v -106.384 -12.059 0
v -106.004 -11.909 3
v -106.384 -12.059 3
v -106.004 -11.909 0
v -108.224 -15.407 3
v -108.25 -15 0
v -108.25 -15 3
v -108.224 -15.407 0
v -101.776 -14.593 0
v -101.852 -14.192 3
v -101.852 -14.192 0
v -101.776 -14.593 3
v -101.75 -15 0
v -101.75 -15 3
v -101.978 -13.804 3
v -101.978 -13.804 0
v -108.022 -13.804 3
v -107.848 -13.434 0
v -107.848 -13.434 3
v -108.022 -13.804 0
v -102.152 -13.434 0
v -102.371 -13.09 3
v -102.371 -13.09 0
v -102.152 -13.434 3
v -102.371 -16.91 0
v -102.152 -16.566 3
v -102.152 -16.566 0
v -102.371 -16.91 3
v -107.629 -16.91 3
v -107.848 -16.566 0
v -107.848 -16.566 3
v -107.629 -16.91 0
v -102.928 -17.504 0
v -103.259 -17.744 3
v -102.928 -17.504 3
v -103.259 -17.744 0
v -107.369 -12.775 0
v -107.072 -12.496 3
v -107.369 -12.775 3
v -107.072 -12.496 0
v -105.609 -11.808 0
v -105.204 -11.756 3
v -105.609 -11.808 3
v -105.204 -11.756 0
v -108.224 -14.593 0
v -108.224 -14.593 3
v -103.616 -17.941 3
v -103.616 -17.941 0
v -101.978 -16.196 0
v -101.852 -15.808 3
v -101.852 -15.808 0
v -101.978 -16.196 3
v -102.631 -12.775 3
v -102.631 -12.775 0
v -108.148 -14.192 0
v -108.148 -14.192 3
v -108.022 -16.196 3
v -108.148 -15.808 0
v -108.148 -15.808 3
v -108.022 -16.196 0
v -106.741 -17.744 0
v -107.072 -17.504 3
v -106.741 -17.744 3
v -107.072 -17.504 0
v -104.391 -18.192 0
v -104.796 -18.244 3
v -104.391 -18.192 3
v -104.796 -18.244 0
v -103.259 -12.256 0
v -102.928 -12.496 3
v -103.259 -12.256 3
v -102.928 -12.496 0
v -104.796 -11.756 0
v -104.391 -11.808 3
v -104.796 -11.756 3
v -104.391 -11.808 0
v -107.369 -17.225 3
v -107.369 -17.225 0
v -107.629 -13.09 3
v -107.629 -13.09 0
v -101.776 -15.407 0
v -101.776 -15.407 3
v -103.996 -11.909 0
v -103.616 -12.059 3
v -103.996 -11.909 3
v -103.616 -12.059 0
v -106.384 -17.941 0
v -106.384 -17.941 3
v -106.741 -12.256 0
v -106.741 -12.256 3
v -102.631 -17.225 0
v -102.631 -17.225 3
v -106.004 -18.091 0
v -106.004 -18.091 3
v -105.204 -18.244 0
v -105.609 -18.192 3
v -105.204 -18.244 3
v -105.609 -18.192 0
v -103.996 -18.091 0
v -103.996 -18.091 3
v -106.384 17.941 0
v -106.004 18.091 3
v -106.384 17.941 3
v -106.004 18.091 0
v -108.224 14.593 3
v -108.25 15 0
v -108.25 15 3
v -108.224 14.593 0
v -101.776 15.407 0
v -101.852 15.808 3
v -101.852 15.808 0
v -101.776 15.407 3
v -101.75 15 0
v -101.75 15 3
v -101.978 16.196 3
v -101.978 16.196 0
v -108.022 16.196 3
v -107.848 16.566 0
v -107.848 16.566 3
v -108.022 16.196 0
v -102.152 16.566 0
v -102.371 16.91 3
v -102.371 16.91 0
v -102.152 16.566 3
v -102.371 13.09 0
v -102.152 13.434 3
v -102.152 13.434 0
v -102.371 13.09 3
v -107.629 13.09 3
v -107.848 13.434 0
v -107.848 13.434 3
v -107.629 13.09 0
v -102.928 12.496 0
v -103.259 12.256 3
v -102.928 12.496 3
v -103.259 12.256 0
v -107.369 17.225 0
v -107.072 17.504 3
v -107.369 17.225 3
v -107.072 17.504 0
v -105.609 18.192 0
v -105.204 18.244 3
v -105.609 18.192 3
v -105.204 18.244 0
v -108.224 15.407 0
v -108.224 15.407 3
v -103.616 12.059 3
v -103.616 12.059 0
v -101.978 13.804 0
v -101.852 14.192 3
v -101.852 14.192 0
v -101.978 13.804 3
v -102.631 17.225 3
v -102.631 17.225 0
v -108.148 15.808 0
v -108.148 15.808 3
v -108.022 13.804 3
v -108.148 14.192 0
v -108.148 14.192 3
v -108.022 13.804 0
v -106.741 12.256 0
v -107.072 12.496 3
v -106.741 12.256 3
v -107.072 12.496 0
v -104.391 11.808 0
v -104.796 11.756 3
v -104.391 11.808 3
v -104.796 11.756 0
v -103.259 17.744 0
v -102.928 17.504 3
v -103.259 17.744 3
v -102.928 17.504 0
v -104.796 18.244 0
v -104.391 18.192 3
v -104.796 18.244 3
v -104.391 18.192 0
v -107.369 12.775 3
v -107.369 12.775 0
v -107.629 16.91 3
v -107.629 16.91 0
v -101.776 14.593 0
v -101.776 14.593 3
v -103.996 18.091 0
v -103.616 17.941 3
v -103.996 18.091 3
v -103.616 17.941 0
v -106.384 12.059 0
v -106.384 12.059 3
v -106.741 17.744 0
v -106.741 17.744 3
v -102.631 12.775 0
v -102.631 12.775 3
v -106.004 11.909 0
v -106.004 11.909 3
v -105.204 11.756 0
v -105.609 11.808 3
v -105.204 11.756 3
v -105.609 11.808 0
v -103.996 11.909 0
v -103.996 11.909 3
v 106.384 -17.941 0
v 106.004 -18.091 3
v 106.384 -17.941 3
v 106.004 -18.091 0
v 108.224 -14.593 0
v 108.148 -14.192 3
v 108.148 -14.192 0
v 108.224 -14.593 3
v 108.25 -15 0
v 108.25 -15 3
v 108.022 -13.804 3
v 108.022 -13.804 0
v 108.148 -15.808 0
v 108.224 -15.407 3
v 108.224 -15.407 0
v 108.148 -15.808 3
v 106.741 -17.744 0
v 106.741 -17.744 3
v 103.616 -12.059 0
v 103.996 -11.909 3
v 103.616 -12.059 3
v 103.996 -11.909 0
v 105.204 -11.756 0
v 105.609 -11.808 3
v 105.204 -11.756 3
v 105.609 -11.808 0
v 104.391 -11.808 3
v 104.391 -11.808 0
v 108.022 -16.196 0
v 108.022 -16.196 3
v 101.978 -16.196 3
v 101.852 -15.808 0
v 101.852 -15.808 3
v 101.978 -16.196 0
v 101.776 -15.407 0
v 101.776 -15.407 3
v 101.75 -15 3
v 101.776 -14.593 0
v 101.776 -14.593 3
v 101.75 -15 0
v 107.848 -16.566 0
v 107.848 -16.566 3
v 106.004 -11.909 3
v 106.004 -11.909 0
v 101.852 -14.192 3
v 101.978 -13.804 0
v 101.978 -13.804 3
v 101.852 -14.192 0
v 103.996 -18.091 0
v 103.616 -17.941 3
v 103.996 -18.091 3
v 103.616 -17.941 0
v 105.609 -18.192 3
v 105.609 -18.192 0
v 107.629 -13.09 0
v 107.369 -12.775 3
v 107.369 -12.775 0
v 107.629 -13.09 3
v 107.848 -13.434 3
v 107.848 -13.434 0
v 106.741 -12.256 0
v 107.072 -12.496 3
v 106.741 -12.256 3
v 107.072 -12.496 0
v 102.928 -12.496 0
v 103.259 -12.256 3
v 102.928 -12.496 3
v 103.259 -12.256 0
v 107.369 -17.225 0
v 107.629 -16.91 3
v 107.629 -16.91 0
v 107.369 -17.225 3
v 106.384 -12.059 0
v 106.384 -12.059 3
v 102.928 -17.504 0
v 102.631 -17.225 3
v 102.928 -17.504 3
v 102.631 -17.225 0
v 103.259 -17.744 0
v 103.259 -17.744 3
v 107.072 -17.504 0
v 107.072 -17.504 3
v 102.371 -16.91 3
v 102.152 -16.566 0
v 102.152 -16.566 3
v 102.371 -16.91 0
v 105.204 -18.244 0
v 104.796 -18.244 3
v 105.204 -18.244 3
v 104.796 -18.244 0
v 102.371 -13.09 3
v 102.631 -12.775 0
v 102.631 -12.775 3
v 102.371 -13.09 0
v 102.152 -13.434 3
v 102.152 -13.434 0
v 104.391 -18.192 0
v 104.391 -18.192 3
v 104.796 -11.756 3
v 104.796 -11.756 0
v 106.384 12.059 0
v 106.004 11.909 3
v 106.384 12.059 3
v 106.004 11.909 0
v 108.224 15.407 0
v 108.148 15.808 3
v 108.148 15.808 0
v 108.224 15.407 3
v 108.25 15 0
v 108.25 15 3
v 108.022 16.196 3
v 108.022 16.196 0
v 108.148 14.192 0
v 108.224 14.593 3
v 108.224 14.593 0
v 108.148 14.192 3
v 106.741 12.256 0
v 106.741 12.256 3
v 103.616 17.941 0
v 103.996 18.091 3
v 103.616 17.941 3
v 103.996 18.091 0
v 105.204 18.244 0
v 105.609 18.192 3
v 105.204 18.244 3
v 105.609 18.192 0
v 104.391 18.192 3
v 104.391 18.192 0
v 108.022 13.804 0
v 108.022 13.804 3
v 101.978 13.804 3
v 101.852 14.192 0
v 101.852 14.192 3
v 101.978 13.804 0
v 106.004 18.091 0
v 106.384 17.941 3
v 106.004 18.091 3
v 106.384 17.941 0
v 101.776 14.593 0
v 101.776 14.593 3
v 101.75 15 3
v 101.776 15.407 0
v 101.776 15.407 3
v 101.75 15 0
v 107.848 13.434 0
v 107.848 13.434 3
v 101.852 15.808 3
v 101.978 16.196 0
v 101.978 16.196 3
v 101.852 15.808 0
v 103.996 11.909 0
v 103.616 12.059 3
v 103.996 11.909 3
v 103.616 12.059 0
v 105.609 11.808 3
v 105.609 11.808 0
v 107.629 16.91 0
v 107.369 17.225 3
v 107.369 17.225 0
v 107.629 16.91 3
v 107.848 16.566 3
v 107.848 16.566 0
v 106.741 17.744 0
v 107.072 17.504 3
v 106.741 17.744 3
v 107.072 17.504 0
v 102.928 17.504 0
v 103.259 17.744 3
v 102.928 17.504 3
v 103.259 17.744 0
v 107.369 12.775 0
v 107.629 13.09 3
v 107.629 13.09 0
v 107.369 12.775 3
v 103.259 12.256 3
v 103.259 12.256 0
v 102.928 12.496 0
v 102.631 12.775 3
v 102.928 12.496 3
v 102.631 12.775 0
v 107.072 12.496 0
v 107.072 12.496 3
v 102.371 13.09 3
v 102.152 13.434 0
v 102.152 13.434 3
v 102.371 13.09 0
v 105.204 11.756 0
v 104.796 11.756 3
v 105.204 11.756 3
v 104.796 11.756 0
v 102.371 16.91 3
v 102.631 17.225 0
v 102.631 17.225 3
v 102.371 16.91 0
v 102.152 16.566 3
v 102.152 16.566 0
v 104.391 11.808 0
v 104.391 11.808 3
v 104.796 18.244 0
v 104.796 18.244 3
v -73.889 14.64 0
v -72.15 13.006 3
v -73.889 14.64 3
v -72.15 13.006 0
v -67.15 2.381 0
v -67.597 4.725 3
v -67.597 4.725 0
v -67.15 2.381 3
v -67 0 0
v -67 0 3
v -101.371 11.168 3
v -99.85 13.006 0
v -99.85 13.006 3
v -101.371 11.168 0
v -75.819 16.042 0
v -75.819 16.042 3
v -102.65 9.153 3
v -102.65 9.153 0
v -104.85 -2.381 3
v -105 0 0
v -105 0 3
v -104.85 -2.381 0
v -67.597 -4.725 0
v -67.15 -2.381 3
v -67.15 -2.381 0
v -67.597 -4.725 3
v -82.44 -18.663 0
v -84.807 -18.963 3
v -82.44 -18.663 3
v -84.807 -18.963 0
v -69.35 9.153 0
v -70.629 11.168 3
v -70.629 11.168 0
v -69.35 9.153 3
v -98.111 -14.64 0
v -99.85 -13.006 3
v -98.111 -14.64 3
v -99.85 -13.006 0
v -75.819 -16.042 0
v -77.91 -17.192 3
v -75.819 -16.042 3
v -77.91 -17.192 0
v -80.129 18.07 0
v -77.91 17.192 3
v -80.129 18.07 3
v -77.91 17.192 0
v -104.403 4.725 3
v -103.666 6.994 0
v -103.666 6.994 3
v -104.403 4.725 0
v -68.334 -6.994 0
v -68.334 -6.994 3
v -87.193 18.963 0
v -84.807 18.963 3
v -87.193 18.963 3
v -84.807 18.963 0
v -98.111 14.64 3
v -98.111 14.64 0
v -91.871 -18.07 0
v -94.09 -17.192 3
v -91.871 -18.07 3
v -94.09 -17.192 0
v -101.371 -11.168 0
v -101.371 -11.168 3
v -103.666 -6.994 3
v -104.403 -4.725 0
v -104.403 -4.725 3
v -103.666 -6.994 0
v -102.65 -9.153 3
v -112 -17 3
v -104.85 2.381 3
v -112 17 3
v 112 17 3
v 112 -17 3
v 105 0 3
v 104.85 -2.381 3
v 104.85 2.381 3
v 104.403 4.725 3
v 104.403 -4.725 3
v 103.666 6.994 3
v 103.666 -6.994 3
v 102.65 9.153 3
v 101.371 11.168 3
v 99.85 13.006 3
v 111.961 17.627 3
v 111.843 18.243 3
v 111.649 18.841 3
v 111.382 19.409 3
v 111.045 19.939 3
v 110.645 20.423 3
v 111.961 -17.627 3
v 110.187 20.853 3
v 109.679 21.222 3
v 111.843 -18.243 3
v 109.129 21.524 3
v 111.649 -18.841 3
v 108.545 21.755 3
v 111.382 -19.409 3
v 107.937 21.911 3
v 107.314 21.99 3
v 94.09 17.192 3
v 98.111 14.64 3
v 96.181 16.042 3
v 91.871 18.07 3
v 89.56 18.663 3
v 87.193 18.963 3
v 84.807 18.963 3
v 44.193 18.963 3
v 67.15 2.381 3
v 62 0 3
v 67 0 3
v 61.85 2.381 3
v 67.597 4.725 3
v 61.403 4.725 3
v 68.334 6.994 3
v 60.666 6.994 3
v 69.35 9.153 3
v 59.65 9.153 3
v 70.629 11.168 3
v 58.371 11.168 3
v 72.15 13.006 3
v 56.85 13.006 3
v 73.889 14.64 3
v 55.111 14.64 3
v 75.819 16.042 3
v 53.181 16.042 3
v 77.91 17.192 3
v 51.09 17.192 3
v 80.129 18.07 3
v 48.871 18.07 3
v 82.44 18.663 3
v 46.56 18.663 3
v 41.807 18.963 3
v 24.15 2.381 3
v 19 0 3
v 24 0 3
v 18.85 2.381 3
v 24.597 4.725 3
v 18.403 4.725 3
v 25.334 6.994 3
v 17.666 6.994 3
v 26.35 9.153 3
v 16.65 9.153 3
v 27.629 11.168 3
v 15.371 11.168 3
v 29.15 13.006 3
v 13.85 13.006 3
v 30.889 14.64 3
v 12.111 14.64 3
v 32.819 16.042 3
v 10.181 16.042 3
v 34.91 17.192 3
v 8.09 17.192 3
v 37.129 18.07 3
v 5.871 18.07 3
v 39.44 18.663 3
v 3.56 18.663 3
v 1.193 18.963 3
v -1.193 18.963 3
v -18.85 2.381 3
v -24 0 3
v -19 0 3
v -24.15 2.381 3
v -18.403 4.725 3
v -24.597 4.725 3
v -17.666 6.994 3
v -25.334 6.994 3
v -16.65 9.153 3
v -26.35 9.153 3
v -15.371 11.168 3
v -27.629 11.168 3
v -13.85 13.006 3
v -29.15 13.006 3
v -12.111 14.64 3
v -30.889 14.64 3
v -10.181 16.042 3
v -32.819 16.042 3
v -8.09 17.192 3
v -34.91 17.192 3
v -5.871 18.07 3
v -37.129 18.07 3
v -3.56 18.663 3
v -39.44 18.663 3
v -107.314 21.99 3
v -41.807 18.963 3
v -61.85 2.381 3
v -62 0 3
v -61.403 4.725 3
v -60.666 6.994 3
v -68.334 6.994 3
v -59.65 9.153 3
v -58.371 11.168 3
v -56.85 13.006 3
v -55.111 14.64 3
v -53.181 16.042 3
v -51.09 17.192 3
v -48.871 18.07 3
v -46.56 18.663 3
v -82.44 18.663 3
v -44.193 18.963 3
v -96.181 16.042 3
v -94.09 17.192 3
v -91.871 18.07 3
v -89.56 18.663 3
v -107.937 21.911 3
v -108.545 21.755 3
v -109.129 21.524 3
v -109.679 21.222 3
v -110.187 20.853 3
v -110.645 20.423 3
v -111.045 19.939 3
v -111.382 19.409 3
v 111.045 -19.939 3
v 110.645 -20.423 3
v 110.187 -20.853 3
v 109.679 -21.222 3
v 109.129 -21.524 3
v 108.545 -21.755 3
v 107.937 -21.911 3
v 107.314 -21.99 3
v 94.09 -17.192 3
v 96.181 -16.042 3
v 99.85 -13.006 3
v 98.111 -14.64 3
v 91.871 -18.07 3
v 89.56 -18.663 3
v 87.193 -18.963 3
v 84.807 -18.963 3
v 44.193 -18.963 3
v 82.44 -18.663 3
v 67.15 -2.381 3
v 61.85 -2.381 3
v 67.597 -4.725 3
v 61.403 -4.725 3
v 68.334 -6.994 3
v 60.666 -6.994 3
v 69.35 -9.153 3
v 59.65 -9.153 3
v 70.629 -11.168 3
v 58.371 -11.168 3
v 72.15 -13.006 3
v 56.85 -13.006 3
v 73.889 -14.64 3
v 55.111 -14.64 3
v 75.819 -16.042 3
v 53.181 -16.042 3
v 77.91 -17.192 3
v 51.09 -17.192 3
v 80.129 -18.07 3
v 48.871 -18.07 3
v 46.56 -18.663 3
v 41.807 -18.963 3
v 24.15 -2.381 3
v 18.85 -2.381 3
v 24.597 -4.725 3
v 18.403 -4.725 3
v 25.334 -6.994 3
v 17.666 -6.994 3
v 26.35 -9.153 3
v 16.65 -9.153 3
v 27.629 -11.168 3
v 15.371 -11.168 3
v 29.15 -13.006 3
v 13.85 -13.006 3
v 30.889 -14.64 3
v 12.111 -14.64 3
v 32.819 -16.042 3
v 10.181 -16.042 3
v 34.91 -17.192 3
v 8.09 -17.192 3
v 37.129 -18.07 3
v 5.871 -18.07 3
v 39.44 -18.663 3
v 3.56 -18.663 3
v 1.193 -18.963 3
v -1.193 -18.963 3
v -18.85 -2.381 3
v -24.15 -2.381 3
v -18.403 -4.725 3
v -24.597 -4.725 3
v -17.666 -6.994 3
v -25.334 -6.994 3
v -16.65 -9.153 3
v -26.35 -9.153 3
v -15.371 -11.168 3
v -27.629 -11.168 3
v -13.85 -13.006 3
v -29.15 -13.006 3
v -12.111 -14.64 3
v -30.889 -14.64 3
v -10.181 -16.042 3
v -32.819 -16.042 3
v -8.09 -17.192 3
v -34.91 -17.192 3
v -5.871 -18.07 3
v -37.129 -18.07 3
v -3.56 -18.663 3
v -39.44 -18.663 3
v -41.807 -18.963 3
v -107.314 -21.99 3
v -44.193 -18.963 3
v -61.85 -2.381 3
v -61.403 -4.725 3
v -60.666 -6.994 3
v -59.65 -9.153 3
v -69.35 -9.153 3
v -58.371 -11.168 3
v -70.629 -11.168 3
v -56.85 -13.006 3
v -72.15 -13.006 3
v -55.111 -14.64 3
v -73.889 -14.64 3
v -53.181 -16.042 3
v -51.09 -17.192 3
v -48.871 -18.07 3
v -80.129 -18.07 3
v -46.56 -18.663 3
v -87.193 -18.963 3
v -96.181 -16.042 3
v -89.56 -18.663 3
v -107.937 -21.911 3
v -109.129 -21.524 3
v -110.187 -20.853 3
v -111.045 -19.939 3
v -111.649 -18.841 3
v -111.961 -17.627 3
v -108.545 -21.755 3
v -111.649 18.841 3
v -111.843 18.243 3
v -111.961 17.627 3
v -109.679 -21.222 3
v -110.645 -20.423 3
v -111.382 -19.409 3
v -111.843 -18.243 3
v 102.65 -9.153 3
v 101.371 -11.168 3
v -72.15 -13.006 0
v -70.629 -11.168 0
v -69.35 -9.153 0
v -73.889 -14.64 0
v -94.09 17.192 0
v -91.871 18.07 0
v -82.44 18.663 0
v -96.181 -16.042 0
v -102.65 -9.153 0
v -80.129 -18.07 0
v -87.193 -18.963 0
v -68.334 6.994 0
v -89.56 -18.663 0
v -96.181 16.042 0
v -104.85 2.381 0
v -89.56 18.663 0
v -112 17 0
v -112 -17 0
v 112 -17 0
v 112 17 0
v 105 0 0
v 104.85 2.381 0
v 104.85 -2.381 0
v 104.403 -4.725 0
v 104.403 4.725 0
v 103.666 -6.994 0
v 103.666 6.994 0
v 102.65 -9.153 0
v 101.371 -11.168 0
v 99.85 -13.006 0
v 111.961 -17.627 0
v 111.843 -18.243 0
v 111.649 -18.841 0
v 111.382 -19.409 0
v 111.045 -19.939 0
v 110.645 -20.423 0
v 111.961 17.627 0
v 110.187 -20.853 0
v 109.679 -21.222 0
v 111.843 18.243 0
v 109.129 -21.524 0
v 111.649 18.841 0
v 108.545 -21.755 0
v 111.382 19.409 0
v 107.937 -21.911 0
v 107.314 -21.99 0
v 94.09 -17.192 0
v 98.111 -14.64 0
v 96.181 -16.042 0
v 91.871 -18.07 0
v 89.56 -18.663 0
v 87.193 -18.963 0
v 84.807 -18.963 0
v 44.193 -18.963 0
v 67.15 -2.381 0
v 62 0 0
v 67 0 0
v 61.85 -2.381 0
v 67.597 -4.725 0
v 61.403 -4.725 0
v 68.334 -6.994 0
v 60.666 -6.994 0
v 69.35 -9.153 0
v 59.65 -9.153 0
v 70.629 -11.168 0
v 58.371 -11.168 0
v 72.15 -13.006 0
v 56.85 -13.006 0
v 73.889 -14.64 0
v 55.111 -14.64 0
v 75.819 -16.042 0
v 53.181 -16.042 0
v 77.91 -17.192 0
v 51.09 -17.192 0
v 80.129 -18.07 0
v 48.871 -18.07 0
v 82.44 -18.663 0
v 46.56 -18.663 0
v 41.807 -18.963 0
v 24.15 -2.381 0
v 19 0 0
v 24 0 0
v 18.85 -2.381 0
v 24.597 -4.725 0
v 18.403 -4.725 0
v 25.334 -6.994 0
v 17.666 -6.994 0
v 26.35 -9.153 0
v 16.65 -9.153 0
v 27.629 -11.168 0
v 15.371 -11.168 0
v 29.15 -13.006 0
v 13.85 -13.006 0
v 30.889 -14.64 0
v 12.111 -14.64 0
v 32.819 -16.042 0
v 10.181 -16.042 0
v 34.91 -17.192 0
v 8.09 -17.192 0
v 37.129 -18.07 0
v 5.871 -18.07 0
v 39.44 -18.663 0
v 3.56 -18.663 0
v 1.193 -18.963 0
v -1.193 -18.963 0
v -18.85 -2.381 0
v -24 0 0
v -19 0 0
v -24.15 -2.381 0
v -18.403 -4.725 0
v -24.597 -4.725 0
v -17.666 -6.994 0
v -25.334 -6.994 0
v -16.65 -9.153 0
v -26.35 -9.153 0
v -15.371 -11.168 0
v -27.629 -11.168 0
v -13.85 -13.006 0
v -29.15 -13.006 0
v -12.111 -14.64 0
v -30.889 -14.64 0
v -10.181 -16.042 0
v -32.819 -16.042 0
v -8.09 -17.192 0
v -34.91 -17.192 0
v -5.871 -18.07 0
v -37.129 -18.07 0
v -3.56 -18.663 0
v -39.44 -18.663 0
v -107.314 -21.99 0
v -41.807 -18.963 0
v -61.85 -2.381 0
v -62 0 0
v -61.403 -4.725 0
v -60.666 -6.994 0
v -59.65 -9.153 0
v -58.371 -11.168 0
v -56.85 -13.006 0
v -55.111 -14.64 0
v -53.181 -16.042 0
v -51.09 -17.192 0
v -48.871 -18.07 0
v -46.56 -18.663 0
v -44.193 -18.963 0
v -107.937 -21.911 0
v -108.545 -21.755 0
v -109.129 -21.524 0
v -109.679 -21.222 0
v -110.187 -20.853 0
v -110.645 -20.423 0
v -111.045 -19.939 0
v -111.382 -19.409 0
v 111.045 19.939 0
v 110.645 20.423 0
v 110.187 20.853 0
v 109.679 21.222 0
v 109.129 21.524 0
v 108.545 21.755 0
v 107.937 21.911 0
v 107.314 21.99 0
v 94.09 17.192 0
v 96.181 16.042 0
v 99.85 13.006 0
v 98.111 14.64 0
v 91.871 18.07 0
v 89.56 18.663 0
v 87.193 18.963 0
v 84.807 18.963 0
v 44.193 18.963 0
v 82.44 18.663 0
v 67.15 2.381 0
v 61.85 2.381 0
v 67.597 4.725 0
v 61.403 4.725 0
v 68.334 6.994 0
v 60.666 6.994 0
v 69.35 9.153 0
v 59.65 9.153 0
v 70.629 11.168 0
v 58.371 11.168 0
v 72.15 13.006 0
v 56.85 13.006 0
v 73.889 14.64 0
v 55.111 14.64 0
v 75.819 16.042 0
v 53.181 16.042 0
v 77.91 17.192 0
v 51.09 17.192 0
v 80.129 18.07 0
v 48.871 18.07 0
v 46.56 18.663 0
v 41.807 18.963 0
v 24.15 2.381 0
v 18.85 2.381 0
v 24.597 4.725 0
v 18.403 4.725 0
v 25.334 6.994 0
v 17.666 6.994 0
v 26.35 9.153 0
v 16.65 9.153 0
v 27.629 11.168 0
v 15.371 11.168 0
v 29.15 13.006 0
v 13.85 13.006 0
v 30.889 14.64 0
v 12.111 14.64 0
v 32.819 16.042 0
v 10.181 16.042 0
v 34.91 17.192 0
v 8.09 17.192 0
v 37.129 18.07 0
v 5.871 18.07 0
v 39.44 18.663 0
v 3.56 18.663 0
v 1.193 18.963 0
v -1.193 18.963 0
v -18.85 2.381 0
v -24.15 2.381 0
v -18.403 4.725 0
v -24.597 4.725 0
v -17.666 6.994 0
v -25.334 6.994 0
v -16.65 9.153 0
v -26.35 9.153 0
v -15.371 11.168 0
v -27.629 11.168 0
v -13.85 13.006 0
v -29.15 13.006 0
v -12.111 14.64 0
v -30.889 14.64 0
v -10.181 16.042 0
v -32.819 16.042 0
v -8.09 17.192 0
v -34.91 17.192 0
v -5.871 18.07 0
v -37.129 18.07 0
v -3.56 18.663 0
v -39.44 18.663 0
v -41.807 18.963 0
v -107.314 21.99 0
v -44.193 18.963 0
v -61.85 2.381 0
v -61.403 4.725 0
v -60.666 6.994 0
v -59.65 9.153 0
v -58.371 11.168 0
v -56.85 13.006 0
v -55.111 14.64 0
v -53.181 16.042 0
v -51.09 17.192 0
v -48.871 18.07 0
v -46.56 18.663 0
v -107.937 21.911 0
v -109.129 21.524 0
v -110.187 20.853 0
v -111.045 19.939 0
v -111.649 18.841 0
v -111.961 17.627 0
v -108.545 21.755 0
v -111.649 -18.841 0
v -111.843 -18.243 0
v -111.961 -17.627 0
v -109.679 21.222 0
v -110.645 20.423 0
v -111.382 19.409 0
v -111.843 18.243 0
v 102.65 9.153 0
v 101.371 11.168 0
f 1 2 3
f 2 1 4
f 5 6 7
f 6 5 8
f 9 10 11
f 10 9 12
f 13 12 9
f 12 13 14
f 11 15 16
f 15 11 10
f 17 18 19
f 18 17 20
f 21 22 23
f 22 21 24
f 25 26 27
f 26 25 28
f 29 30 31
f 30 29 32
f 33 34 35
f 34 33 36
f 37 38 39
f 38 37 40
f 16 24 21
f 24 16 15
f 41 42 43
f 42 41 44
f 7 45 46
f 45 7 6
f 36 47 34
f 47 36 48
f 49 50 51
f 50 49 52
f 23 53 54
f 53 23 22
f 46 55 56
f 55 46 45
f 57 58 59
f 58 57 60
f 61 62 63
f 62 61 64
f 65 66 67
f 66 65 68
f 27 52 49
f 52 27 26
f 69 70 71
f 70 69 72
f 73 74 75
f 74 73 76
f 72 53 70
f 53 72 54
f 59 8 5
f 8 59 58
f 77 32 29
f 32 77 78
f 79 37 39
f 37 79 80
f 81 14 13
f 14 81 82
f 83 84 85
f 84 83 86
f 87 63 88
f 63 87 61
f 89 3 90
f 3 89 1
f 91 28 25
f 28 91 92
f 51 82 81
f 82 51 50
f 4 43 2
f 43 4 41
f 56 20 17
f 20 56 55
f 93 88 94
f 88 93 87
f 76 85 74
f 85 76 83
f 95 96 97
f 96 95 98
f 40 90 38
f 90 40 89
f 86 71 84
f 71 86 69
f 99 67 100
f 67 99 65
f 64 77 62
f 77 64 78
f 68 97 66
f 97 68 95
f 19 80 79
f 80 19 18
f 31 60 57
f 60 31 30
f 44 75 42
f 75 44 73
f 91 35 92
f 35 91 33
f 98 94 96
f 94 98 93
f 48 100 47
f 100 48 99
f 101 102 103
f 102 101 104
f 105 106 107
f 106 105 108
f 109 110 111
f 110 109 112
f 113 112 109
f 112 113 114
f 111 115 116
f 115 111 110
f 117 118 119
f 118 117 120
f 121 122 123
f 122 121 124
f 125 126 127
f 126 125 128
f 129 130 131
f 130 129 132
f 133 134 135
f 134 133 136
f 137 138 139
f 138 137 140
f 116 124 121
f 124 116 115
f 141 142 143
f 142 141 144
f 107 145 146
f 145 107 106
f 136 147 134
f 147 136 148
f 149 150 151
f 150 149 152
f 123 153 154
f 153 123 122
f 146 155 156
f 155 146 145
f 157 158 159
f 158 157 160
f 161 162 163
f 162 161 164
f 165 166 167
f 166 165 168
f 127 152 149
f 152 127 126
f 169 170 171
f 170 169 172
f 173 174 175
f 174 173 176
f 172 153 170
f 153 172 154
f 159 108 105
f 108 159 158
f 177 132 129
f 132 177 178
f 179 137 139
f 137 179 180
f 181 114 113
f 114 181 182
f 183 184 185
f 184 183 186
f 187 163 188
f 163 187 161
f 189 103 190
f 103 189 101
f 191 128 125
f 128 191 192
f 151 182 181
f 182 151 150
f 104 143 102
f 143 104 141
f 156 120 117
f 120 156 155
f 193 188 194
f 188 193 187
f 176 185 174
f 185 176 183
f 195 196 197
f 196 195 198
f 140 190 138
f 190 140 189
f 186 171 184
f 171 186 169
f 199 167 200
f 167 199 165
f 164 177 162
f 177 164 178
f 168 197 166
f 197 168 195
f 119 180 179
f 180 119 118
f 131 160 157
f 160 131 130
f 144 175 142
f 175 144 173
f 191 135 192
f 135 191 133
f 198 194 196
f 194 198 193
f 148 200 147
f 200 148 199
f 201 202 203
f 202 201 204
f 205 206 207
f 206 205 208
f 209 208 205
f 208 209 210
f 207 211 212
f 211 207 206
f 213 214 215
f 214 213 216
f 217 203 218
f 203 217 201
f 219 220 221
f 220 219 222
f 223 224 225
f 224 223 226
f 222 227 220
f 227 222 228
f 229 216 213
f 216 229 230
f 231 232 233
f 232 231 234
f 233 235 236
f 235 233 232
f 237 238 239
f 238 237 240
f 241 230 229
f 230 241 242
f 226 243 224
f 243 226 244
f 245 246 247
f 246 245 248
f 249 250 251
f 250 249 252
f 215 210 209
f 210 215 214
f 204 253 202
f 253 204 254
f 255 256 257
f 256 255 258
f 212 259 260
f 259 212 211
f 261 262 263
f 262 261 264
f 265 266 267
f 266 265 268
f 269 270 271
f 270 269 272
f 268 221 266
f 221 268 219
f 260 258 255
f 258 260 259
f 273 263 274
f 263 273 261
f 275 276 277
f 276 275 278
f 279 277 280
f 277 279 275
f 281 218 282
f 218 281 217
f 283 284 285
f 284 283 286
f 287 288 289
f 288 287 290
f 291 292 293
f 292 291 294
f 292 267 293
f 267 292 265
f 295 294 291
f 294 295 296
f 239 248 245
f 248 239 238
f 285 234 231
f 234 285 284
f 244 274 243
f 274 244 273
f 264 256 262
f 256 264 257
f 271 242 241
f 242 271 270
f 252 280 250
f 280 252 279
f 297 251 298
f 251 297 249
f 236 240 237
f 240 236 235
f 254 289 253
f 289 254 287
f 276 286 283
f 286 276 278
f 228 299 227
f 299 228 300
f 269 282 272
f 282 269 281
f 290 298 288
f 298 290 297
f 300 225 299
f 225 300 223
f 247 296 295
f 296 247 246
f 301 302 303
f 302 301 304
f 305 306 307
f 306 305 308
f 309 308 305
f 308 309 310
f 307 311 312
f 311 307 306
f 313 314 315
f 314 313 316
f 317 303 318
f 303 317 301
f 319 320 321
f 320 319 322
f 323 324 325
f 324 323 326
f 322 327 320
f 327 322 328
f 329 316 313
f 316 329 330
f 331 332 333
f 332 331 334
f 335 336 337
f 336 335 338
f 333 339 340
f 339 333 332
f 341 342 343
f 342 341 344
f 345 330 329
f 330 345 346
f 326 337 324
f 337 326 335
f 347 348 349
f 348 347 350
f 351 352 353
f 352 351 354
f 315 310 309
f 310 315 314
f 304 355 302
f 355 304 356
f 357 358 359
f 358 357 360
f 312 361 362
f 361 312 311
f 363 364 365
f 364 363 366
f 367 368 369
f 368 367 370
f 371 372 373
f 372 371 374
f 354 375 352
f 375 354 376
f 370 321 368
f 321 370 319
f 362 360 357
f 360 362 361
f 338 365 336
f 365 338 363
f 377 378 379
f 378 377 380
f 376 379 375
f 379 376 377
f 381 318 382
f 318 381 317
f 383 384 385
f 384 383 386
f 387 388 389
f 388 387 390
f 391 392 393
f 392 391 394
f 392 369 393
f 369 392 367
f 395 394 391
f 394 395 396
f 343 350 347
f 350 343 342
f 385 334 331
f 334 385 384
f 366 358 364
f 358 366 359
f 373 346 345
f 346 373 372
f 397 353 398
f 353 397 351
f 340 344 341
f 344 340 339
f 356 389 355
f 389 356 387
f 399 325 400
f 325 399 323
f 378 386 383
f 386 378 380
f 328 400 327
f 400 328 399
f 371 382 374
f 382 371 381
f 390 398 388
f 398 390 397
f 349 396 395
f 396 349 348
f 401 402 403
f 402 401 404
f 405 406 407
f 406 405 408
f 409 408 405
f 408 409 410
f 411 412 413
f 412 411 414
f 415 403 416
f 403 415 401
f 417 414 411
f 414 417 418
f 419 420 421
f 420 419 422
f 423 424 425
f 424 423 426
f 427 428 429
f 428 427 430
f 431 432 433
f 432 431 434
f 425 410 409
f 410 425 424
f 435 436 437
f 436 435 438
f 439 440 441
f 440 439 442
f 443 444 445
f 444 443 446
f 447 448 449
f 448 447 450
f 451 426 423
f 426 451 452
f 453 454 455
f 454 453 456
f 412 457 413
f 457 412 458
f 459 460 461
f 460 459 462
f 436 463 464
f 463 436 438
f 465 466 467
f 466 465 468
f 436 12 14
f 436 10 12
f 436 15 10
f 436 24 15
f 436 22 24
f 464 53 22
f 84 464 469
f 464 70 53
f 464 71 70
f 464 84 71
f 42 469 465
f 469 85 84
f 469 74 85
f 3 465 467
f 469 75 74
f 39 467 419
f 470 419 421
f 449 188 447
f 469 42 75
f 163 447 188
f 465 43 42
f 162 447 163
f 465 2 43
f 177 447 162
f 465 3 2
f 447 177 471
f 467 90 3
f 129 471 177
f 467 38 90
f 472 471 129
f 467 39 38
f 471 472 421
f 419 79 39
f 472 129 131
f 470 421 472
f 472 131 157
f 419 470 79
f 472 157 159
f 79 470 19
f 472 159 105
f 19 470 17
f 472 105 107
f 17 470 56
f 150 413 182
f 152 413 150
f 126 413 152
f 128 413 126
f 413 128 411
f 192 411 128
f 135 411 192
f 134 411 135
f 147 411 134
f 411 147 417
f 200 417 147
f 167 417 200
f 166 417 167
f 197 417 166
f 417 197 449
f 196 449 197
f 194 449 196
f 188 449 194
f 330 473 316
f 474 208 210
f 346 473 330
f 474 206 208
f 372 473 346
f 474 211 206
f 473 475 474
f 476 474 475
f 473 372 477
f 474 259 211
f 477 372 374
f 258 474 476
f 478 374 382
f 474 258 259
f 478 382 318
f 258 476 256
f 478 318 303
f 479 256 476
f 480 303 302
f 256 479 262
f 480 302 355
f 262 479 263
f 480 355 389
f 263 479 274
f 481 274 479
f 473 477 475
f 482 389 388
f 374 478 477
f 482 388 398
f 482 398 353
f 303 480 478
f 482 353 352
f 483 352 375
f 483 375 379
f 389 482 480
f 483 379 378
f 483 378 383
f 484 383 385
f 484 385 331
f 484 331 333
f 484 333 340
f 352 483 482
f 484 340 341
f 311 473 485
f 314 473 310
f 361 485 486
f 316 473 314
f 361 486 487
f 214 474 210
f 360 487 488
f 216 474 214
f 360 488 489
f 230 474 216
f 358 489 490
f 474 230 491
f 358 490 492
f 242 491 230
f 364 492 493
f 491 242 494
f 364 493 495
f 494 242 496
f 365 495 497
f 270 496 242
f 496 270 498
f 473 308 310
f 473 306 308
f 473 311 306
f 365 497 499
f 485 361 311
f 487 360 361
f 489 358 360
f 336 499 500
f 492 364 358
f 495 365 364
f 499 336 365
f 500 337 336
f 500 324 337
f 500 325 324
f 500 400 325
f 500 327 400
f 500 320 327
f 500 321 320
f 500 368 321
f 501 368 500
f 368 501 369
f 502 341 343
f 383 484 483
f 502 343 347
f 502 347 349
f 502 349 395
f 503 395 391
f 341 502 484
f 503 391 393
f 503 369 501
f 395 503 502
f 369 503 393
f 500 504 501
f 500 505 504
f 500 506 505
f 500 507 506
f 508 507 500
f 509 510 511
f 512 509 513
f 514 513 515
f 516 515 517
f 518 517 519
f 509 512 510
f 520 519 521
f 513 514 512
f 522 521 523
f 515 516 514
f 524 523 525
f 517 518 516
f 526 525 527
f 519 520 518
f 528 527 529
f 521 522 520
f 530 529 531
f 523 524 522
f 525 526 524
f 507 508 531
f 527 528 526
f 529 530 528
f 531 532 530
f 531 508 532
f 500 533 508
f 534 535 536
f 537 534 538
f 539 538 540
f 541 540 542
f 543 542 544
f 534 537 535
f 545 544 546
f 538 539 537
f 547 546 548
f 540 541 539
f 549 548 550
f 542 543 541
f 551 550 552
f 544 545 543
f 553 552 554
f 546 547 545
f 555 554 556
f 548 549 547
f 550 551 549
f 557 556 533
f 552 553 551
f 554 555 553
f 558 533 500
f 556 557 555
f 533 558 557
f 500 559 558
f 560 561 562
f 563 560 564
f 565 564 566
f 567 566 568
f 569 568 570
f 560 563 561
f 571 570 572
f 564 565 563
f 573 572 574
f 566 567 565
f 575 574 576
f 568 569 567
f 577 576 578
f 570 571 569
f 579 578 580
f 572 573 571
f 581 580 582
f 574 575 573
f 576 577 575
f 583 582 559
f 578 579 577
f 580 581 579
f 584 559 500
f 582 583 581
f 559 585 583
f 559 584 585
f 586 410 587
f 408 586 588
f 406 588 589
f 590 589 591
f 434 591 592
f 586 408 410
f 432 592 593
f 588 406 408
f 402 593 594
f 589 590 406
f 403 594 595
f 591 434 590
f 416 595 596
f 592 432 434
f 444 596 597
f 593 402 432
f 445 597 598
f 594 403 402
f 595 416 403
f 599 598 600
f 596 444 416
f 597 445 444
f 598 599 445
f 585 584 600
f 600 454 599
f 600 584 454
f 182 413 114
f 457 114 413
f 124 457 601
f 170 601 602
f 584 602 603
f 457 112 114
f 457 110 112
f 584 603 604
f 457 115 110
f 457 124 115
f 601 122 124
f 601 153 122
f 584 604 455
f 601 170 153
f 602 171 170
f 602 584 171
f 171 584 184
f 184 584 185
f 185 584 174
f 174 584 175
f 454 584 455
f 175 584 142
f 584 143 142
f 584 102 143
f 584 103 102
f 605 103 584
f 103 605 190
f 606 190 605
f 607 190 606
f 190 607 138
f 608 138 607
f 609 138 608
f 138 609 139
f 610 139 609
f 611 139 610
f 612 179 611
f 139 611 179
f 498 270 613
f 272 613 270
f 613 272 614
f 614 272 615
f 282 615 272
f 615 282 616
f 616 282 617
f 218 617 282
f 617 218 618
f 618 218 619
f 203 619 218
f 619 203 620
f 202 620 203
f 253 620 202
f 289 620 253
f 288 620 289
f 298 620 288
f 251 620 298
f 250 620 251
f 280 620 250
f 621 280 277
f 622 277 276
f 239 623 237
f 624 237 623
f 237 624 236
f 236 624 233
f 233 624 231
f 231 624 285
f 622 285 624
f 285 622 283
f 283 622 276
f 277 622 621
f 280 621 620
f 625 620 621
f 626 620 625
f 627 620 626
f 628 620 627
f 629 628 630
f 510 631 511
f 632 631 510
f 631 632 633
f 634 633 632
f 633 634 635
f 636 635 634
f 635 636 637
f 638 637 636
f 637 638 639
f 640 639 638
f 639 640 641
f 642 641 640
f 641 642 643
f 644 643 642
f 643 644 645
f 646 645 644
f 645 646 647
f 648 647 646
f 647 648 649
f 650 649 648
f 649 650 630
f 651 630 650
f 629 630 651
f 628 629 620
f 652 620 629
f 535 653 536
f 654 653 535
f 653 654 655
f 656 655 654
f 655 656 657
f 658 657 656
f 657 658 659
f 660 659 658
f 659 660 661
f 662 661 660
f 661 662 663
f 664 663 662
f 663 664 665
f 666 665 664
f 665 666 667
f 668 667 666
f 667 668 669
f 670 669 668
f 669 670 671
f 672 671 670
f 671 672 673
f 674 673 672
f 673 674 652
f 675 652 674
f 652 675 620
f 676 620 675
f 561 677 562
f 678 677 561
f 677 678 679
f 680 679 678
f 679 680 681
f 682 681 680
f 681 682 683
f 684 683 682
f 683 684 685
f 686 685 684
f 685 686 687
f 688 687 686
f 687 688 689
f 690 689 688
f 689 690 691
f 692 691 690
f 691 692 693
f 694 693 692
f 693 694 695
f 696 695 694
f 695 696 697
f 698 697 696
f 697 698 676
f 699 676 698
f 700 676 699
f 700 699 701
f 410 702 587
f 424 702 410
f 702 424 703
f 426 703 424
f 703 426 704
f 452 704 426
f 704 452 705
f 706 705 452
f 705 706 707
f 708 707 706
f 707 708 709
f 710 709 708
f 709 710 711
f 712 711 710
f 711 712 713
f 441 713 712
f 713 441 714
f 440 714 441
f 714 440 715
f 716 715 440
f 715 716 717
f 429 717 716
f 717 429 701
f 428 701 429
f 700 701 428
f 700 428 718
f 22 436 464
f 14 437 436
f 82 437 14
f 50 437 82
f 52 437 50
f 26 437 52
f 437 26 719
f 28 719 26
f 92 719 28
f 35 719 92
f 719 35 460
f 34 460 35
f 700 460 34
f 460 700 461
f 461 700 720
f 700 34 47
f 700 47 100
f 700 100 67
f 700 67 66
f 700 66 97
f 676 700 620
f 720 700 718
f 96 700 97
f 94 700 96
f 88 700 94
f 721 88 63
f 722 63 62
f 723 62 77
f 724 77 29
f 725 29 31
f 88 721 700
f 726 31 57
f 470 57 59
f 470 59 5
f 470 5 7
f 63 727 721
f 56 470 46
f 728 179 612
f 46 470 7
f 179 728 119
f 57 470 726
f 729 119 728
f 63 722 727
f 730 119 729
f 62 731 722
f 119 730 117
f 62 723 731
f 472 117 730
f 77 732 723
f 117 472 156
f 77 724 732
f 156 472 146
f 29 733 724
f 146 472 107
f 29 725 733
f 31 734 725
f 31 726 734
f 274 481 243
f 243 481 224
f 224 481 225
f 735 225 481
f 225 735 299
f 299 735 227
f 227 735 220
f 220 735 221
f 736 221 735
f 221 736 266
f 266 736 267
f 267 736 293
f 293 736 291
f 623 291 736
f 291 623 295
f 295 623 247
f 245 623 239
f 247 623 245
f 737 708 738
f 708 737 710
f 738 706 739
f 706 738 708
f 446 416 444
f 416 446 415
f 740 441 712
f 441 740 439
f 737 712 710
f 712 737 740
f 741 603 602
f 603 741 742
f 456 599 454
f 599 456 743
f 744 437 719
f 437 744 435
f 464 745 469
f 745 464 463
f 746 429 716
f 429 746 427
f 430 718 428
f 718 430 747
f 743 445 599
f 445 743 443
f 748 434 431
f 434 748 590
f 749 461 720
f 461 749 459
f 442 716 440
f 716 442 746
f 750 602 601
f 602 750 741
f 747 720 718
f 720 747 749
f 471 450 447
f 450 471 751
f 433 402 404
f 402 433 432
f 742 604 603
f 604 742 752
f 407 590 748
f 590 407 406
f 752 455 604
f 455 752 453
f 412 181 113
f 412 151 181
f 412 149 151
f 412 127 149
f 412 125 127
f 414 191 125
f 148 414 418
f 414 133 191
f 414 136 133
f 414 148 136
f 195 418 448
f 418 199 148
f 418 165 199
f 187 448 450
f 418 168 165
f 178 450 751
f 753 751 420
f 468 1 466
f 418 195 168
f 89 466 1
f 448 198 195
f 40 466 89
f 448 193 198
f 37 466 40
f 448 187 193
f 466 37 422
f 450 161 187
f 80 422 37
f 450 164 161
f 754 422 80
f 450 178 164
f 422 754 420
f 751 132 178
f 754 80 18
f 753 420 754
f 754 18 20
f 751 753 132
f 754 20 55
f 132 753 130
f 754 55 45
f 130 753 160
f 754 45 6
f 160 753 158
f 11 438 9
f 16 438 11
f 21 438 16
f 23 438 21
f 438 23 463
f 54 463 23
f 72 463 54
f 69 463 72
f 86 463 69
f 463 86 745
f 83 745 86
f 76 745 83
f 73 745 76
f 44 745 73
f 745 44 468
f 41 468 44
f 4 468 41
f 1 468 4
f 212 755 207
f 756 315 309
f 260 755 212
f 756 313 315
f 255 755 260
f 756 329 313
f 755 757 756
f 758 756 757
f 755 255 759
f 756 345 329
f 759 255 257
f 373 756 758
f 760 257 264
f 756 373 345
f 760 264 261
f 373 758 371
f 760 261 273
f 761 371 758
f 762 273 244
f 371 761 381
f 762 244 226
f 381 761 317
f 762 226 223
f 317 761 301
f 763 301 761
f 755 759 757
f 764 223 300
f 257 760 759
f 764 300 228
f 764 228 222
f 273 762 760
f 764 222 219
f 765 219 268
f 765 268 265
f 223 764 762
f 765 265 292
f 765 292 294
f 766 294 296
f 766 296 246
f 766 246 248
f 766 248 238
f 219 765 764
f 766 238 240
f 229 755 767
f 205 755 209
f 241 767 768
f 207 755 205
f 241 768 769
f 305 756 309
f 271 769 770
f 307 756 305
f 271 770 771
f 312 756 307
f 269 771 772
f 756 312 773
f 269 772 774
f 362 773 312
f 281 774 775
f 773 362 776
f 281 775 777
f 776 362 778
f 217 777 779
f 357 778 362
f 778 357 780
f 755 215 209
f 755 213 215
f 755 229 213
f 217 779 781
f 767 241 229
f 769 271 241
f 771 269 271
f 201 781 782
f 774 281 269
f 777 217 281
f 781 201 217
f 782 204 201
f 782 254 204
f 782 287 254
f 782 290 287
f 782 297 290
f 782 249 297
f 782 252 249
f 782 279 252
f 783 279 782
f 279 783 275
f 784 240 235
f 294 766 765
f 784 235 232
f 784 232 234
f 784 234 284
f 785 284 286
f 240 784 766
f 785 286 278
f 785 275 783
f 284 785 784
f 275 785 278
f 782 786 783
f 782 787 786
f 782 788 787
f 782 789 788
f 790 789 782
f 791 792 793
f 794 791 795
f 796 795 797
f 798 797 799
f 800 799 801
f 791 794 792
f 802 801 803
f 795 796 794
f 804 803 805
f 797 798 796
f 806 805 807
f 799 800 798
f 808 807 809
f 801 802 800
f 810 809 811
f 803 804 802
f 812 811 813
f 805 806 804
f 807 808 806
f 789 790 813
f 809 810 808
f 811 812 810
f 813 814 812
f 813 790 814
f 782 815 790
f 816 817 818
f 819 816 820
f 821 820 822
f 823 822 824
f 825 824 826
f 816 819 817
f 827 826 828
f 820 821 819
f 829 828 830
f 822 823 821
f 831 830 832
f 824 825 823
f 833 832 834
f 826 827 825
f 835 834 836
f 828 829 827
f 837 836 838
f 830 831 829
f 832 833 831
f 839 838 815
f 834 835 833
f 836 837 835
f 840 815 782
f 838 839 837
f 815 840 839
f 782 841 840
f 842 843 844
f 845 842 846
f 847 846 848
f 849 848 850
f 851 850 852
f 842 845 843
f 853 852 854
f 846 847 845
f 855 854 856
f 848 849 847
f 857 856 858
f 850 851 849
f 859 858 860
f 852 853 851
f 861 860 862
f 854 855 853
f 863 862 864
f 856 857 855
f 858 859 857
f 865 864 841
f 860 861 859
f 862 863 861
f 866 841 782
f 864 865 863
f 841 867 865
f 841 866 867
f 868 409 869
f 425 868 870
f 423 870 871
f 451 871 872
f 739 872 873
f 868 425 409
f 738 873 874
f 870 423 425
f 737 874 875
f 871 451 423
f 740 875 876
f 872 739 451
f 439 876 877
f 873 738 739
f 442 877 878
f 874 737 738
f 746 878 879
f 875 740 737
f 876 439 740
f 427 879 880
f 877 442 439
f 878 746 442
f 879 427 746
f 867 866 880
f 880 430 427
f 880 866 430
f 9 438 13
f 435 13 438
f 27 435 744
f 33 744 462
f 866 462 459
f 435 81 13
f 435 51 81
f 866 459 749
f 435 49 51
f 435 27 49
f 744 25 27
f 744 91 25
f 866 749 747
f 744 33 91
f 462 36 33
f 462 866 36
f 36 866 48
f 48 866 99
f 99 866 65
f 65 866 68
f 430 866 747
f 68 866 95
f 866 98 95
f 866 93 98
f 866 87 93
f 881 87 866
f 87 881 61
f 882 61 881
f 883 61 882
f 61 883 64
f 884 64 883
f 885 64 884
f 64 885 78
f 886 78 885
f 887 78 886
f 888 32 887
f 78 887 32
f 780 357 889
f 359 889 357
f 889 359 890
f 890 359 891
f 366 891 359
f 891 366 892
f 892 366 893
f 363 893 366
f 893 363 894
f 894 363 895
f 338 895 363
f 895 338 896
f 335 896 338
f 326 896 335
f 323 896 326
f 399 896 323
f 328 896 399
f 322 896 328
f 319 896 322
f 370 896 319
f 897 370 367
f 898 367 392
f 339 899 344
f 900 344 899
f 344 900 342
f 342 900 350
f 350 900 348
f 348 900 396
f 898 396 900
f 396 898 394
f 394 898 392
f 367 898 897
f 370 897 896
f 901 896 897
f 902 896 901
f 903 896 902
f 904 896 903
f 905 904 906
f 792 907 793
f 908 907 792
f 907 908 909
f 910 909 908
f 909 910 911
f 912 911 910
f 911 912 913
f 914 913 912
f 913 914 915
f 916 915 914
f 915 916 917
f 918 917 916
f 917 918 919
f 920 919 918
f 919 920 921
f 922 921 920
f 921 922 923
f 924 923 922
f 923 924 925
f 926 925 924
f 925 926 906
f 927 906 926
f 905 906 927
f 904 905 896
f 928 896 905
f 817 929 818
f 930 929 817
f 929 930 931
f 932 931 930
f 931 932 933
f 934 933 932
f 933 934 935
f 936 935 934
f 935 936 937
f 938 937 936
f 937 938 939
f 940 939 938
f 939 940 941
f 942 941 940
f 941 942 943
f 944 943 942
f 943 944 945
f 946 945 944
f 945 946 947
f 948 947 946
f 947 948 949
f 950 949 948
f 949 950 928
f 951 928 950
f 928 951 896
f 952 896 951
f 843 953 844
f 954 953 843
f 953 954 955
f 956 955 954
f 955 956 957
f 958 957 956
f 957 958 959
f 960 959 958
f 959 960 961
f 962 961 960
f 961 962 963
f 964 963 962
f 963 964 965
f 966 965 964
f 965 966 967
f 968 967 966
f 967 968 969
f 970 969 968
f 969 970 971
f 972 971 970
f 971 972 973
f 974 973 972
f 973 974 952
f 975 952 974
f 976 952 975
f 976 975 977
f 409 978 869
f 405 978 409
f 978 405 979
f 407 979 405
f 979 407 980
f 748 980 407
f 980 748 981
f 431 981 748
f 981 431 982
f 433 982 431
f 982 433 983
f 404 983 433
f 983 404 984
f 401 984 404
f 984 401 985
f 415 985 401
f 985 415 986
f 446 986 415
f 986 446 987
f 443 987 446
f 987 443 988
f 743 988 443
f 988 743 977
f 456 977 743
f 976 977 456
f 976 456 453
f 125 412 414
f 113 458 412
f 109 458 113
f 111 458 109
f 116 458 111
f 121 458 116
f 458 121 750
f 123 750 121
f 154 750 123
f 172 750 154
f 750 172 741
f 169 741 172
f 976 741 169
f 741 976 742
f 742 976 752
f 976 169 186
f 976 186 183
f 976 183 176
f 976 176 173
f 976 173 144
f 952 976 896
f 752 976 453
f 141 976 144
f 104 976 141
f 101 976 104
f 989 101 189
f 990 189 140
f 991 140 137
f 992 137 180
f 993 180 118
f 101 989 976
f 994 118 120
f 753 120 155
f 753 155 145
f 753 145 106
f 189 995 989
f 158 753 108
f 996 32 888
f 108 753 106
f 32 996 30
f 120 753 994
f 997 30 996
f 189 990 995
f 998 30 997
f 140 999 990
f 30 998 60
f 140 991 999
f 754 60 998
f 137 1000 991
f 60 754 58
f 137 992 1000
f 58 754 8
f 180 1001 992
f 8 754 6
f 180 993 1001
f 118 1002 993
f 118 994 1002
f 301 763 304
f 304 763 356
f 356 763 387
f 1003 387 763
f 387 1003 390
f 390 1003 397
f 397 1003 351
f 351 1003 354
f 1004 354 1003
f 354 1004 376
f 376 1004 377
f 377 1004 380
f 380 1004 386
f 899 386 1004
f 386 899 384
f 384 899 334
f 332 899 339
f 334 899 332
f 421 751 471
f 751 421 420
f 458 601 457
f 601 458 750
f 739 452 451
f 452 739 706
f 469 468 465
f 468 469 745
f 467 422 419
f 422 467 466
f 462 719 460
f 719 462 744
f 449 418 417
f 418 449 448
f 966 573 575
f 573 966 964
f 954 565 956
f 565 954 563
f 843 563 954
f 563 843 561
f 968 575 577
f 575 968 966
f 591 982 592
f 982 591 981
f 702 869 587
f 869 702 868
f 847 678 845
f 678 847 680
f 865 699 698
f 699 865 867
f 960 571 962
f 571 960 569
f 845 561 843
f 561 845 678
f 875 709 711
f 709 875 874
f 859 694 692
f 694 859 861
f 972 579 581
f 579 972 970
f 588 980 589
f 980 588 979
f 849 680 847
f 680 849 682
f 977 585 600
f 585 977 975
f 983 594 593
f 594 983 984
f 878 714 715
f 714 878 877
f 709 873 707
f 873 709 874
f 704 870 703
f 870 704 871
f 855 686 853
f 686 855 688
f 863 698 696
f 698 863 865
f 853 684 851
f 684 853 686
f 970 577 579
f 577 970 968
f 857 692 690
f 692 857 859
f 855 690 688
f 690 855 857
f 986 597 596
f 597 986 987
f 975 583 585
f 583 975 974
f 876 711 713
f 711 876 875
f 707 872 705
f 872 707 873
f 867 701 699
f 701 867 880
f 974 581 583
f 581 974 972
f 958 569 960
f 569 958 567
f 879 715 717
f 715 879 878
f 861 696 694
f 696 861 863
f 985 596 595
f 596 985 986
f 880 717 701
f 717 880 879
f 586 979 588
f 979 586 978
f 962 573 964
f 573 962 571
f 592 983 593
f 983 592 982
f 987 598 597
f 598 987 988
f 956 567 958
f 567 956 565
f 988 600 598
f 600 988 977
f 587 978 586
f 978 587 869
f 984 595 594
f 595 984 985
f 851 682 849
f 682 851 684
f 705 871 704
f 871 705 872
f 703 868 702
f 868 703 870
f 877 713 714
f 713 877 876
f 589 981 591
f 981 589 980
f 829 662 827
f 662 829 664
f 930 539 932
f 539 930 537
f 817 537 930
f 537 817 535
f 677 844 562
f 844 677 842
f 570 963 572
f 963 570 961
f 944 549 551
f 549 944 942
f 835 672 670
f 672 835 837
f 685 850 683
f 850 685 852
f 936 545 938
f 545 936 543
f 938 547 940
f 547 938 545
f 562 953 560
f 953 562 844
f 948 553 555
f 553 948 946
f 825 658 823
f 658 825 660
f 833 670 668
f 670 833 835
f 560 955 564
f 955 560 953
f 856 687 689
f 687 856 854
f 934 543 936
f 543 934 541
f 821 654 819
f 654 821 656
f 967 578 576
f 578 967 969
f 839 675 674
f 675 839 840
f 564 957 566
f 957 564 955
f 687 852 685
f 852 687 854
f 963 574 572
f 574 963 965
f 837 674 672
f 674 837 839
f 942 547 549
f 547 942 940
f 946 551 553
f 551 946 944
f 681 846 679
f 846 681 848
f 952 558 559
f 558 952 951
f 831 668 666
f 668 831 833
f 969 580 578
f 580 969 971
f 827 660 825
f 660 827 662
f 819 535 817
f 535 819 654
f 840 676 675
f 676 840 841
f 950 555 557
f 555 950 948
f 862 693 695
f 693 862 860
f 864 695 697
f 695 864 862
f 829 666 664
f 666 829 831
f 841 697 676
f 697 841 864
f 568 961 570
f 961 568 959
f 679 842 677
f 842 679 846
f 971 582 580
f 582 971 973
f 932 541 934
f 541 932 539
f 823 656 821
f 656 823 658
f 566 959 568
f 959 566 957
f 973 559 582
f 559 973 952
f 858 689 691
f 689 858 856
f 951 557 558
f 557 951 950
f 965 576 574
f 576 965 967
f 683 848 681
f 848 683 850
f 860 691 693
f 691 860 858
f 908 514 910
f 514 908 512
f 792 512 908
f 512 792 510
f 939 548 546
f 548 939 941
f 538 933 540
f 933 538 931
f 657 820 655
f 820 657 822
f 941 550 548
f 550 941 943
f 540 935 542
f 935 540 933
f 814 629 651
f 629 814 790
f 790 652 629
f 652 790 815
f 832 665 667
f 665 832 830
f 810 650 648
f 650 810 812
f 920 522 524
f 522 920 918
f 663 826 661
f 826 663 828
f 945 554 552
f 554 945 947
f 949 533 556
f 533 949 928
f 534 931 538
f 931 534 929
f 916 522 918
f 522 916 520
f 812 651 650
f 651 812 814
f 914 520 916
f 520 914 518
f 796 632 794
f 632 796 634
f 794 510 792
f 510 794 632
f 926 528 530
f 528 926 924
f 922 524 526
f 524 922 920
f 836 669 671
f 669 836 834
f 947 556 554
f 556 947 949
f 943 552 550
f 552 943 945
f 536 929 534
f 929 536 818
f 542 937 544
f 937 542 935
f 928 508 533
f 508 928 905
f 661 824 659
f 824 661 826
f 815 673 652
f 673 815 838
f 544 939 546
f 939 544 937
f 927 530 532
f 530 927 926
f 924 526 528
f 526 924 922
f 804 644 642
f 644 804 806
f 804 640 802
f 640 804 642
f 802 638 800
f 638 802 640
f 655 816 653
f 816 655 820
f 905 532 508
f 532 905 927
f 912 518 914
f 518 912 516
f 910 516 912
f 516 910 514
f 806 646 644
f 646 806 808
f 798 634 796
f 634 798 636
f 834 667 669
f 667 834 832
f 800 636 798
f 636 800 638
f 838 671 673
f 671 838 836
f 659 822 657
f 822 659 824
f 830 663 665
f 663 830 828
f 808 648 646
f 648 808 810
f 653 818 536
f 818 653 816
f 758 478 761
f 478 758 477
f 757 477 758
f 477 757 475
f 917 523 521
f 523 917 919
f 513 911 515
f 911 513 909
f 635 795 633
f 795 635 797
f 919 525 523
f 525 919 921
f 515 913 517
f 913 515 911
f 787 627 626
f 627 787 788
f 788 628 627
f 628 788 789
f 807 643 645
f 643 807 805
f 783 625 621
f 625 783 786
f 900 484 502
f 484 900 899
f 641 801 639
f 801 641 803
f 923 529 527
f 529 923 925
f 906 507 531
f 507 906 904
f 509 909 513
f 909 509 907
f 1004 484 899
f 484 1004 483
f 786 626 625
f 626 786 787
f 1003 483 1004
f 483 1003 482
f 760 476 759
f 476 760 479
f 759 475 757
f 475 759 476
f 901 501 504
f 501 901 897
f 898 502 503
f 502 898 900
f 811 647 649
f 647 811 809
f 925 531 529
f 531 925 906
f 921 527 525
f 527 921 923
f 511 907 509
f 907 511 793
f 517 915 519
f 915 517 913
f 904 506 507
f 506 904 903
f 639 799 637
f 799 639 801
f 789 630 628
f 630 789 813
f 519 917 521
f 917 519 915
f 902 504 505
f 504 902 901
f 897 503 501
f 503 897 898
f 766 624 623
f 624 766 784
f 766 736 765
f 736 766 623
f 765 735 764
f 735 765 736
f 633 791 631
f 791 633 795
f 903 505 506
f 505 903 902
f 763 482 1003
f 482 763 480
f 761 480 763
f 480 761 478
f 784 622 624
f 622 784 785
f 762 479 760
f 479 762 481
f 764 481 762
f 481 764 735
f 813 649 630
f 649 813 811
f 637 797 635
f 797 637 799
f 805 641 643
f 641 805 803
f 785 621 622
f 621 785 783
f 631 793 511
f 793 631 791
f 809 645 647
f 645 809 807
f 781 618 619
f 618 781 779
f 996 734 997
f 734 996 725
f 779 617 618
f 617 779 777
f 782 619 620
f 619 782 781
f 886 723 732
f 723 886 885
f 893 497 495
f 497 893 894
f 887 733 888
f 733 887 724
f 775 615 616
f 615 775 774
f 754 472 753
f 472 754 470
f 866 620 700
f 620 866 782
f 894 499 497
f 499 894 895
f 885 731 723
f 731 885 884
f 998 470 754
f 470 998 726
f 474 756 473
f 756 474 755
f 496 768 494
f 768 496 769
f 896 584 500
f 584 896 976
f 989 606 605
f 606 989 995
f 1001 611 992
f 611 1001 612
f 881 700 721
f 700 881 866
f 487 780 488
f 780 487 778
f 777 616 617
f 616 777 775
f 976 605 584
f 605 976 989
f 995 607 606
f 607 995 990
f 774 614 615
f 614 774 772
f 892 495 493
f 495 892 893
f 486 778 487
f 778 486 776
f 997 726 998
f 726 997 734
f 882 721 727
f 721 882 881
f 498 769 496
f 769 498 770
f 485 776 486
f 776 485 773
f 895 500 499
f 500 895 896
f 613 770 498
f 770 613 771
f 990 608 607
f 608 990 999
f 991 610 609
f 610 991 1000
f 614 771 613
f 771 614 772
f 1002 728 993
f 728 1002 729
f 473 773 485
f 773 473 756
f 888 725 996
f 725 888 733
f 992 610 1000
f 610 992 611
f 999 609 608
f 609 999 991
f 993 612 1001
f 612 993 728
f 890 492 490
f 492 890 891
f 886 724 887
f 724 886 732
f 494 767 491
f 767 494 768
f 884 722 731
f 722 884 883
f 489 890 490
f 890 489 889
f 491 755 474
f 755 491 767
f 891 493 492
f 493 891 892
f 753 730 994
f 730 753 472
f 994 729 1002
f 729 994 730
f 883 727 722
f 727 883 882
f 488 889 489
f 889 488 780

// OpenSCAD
$fn = 50;

difference() {
	union() {
		hull() {
			translate(v = [-107.0, 17.0, 0]) {
				cylinder(h = 3, r = 5);
			}
			translate(v = [107.0, 17.0, 0]) {
				cylinder(h = 3, r = 5);
			}
			translate(v = [-107.0, -17.0, 0]) {
				cylinder(h = 3, r = 5);
			}
			translate(v = [107.0, -17.0, 0]) {
				cylinder(h = 3, r = 5);
			}
		}
	}
	union() {
		translate(v = [-105.0, -15.0, -100.0]) {
			cylinder(h = 200, r = 3.25);
		}
		translate(v = [-105.0, 15.0, -100.0]) {
			cylinder(h = 200, r = 3.25);
		}
		translate(v = [105.0, -15.0, -100.0]) {
			cylinder(h = 200, r = 3.25);
		}
		translate(v = [105.0, 15.0, -100.0]) {
			cylinder(h = 200, r = 3.25);
		}
		translate(v = [-105.0, -15.0, -100.0]) {
			cylinder(h = 200, r = 1.8);
		}
		translate(v = [-105.0, 15.0, -100.0]) {
			cylinder(h = 200, r = 1.8);
		}
		translate(v = [105.0, -15.0, -100.0]) {
			cylinder(h = 200, r = 1.8);
		}
		translate(v = [105.0, 15.0, -100.0]) {
			cylinder(h = 200, r = 1.8);
		}
		translate(v = [-86.0, 0, 0.0]) {
			cylinder(h = 3, r = 19.0);
		}
		translate(v = [-43.0, 0, 0.0]) {
			cylinder(h = 3, r = 19.0);
		}
		cylinder(h = 3, r = 19.0);
		translate(v = [43.0, 0, 0.0]) {
			cylinder(h = 3, r = 19.0);
		}
		translate(v = [86.0, 0, 0.0]) {
			cylinder(h = 3, r = 19.0);
		}
	}
}
